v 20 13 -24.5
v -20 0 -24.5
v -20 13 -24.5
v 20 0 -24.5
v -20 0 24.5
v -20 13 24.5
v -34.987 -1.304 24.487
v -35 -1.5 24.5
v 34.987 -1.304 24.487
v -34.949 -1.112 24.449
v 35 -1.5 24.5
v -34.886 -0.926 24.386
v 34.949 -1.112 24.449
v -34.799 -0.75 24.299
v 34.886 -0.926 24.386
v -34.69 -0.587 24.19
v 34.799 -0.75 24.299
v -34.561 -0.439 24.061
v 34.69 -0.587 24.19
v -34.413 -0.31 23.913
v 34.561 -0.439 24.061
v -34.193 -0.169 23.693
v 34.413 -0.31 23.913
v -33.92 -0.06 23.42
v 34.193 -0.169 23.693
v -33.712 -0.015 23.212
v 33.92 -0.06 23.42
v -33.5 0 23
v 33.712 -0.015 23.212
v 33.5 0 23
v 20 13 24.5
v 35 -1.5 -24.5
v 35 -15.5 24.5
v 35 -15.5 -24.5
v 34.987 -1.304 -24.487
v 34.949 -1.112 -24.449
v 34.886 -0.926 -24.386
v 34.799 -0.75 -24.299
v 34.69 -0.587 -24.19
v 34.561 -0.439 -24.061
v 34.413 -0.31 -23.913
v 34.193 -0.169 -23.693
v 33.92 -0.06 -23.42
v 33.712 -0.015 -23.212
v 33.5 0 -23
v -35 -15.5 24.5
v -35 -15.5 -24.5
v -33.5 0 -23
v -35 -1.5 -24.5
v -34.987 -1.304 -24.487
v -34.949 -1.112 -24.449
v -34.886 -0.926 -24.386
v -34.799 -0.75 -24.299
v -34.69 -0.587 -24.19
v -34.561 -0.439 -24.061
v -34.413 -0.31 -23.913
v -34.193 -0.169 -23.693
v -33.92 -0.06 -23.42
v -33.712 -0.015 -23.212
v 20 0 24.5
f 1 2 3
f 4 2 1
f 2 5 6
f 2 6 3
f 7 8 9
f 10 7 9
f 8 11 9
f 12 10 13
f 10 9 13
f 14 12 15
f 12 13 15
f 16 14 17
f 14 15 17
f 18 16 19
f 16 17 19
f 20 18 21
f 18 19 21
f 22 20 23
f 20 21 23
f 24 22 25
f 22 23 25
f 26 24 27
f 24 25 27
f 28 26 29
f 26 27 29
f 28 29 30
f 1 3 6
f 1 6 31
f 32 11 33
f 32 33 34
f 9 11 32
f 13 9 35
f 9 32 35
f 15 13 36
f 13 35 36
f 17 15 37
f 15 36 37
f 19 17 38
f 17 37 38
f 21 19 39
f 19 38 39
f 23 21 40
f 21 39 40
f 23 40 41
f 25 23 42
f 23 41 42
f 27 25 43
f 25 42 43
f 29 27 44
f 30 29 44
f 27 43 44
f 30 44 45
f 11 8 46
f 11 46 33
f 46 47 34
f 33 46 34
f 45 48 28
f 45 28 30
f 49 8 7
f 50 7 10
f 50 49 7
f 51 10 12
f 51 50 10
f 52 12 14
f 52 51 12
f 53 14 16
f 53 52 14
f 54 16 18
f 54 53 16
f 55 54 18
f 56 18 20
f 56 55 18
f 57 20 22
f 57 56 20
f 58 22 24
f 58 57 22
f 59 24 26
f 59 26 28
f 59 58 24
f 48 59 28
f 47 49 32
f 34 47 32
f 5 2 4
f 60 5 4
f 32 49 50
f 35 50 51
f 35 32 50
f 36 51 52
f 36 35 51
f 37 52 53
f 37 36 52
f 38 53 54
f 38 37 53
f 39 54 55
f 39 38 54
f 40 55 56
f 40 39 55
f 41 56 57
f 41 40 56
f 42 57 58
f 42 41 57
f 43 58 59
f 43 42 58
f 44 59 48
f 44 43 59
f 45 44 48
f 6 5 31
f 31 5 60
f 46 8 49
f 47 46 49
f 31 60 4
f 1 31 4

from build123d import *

# Parameters (mm, degrees)
SKETCH2_W           = 40
SKETCH2_H           = 49
BOSS_EXTRUDE1_DEPTH = 13
SKETCH2_3_W         = 70
SKETCH2_3_H         = 49
BOSS_EXTRUDE2_DEPTH = 15.5
FILLET2_R           = 1.5


with BuildPart() as part:
    # Sketch2 → Boss-Extrude1 (new body)
    with BuildSketch(Plane(origin=(0, 0, 0), x_dir=(1, 0, 0), z_dir=(0, 1, 0))):
        Rectangle(SKETCH2_W, SKETCH2_H)
    extrude(amount=BOSS_EXTRUDE1_DEPTH)


with BuildPart() as body_2:
    # Sketch2<3> → Boss-Extrude2 (new body)
    with BuildSketch(Plane(origin=(0, 0, 0), x_dir=(1, 0, 0), z_dir=(0, 1, 0))):
        Rectangle(SKETCH2_3_W, SKETCH2_3_H)
    extrude(amount=-BOSS_EXTRUDE2_DEPTH)

    # Fillet2
    fillet2_edges = [body_2.edges().sort_by_distance(p)[0] for p in [
        (0, 0, -24.5),
        (-35, 0, 0),
        (0, 0, 24.5),
        (35, 0, 0),
    ]]
    fillet(fillet2_edges, radius=FILLET2_R)


solid = Compound([part.part, body_2.part])
